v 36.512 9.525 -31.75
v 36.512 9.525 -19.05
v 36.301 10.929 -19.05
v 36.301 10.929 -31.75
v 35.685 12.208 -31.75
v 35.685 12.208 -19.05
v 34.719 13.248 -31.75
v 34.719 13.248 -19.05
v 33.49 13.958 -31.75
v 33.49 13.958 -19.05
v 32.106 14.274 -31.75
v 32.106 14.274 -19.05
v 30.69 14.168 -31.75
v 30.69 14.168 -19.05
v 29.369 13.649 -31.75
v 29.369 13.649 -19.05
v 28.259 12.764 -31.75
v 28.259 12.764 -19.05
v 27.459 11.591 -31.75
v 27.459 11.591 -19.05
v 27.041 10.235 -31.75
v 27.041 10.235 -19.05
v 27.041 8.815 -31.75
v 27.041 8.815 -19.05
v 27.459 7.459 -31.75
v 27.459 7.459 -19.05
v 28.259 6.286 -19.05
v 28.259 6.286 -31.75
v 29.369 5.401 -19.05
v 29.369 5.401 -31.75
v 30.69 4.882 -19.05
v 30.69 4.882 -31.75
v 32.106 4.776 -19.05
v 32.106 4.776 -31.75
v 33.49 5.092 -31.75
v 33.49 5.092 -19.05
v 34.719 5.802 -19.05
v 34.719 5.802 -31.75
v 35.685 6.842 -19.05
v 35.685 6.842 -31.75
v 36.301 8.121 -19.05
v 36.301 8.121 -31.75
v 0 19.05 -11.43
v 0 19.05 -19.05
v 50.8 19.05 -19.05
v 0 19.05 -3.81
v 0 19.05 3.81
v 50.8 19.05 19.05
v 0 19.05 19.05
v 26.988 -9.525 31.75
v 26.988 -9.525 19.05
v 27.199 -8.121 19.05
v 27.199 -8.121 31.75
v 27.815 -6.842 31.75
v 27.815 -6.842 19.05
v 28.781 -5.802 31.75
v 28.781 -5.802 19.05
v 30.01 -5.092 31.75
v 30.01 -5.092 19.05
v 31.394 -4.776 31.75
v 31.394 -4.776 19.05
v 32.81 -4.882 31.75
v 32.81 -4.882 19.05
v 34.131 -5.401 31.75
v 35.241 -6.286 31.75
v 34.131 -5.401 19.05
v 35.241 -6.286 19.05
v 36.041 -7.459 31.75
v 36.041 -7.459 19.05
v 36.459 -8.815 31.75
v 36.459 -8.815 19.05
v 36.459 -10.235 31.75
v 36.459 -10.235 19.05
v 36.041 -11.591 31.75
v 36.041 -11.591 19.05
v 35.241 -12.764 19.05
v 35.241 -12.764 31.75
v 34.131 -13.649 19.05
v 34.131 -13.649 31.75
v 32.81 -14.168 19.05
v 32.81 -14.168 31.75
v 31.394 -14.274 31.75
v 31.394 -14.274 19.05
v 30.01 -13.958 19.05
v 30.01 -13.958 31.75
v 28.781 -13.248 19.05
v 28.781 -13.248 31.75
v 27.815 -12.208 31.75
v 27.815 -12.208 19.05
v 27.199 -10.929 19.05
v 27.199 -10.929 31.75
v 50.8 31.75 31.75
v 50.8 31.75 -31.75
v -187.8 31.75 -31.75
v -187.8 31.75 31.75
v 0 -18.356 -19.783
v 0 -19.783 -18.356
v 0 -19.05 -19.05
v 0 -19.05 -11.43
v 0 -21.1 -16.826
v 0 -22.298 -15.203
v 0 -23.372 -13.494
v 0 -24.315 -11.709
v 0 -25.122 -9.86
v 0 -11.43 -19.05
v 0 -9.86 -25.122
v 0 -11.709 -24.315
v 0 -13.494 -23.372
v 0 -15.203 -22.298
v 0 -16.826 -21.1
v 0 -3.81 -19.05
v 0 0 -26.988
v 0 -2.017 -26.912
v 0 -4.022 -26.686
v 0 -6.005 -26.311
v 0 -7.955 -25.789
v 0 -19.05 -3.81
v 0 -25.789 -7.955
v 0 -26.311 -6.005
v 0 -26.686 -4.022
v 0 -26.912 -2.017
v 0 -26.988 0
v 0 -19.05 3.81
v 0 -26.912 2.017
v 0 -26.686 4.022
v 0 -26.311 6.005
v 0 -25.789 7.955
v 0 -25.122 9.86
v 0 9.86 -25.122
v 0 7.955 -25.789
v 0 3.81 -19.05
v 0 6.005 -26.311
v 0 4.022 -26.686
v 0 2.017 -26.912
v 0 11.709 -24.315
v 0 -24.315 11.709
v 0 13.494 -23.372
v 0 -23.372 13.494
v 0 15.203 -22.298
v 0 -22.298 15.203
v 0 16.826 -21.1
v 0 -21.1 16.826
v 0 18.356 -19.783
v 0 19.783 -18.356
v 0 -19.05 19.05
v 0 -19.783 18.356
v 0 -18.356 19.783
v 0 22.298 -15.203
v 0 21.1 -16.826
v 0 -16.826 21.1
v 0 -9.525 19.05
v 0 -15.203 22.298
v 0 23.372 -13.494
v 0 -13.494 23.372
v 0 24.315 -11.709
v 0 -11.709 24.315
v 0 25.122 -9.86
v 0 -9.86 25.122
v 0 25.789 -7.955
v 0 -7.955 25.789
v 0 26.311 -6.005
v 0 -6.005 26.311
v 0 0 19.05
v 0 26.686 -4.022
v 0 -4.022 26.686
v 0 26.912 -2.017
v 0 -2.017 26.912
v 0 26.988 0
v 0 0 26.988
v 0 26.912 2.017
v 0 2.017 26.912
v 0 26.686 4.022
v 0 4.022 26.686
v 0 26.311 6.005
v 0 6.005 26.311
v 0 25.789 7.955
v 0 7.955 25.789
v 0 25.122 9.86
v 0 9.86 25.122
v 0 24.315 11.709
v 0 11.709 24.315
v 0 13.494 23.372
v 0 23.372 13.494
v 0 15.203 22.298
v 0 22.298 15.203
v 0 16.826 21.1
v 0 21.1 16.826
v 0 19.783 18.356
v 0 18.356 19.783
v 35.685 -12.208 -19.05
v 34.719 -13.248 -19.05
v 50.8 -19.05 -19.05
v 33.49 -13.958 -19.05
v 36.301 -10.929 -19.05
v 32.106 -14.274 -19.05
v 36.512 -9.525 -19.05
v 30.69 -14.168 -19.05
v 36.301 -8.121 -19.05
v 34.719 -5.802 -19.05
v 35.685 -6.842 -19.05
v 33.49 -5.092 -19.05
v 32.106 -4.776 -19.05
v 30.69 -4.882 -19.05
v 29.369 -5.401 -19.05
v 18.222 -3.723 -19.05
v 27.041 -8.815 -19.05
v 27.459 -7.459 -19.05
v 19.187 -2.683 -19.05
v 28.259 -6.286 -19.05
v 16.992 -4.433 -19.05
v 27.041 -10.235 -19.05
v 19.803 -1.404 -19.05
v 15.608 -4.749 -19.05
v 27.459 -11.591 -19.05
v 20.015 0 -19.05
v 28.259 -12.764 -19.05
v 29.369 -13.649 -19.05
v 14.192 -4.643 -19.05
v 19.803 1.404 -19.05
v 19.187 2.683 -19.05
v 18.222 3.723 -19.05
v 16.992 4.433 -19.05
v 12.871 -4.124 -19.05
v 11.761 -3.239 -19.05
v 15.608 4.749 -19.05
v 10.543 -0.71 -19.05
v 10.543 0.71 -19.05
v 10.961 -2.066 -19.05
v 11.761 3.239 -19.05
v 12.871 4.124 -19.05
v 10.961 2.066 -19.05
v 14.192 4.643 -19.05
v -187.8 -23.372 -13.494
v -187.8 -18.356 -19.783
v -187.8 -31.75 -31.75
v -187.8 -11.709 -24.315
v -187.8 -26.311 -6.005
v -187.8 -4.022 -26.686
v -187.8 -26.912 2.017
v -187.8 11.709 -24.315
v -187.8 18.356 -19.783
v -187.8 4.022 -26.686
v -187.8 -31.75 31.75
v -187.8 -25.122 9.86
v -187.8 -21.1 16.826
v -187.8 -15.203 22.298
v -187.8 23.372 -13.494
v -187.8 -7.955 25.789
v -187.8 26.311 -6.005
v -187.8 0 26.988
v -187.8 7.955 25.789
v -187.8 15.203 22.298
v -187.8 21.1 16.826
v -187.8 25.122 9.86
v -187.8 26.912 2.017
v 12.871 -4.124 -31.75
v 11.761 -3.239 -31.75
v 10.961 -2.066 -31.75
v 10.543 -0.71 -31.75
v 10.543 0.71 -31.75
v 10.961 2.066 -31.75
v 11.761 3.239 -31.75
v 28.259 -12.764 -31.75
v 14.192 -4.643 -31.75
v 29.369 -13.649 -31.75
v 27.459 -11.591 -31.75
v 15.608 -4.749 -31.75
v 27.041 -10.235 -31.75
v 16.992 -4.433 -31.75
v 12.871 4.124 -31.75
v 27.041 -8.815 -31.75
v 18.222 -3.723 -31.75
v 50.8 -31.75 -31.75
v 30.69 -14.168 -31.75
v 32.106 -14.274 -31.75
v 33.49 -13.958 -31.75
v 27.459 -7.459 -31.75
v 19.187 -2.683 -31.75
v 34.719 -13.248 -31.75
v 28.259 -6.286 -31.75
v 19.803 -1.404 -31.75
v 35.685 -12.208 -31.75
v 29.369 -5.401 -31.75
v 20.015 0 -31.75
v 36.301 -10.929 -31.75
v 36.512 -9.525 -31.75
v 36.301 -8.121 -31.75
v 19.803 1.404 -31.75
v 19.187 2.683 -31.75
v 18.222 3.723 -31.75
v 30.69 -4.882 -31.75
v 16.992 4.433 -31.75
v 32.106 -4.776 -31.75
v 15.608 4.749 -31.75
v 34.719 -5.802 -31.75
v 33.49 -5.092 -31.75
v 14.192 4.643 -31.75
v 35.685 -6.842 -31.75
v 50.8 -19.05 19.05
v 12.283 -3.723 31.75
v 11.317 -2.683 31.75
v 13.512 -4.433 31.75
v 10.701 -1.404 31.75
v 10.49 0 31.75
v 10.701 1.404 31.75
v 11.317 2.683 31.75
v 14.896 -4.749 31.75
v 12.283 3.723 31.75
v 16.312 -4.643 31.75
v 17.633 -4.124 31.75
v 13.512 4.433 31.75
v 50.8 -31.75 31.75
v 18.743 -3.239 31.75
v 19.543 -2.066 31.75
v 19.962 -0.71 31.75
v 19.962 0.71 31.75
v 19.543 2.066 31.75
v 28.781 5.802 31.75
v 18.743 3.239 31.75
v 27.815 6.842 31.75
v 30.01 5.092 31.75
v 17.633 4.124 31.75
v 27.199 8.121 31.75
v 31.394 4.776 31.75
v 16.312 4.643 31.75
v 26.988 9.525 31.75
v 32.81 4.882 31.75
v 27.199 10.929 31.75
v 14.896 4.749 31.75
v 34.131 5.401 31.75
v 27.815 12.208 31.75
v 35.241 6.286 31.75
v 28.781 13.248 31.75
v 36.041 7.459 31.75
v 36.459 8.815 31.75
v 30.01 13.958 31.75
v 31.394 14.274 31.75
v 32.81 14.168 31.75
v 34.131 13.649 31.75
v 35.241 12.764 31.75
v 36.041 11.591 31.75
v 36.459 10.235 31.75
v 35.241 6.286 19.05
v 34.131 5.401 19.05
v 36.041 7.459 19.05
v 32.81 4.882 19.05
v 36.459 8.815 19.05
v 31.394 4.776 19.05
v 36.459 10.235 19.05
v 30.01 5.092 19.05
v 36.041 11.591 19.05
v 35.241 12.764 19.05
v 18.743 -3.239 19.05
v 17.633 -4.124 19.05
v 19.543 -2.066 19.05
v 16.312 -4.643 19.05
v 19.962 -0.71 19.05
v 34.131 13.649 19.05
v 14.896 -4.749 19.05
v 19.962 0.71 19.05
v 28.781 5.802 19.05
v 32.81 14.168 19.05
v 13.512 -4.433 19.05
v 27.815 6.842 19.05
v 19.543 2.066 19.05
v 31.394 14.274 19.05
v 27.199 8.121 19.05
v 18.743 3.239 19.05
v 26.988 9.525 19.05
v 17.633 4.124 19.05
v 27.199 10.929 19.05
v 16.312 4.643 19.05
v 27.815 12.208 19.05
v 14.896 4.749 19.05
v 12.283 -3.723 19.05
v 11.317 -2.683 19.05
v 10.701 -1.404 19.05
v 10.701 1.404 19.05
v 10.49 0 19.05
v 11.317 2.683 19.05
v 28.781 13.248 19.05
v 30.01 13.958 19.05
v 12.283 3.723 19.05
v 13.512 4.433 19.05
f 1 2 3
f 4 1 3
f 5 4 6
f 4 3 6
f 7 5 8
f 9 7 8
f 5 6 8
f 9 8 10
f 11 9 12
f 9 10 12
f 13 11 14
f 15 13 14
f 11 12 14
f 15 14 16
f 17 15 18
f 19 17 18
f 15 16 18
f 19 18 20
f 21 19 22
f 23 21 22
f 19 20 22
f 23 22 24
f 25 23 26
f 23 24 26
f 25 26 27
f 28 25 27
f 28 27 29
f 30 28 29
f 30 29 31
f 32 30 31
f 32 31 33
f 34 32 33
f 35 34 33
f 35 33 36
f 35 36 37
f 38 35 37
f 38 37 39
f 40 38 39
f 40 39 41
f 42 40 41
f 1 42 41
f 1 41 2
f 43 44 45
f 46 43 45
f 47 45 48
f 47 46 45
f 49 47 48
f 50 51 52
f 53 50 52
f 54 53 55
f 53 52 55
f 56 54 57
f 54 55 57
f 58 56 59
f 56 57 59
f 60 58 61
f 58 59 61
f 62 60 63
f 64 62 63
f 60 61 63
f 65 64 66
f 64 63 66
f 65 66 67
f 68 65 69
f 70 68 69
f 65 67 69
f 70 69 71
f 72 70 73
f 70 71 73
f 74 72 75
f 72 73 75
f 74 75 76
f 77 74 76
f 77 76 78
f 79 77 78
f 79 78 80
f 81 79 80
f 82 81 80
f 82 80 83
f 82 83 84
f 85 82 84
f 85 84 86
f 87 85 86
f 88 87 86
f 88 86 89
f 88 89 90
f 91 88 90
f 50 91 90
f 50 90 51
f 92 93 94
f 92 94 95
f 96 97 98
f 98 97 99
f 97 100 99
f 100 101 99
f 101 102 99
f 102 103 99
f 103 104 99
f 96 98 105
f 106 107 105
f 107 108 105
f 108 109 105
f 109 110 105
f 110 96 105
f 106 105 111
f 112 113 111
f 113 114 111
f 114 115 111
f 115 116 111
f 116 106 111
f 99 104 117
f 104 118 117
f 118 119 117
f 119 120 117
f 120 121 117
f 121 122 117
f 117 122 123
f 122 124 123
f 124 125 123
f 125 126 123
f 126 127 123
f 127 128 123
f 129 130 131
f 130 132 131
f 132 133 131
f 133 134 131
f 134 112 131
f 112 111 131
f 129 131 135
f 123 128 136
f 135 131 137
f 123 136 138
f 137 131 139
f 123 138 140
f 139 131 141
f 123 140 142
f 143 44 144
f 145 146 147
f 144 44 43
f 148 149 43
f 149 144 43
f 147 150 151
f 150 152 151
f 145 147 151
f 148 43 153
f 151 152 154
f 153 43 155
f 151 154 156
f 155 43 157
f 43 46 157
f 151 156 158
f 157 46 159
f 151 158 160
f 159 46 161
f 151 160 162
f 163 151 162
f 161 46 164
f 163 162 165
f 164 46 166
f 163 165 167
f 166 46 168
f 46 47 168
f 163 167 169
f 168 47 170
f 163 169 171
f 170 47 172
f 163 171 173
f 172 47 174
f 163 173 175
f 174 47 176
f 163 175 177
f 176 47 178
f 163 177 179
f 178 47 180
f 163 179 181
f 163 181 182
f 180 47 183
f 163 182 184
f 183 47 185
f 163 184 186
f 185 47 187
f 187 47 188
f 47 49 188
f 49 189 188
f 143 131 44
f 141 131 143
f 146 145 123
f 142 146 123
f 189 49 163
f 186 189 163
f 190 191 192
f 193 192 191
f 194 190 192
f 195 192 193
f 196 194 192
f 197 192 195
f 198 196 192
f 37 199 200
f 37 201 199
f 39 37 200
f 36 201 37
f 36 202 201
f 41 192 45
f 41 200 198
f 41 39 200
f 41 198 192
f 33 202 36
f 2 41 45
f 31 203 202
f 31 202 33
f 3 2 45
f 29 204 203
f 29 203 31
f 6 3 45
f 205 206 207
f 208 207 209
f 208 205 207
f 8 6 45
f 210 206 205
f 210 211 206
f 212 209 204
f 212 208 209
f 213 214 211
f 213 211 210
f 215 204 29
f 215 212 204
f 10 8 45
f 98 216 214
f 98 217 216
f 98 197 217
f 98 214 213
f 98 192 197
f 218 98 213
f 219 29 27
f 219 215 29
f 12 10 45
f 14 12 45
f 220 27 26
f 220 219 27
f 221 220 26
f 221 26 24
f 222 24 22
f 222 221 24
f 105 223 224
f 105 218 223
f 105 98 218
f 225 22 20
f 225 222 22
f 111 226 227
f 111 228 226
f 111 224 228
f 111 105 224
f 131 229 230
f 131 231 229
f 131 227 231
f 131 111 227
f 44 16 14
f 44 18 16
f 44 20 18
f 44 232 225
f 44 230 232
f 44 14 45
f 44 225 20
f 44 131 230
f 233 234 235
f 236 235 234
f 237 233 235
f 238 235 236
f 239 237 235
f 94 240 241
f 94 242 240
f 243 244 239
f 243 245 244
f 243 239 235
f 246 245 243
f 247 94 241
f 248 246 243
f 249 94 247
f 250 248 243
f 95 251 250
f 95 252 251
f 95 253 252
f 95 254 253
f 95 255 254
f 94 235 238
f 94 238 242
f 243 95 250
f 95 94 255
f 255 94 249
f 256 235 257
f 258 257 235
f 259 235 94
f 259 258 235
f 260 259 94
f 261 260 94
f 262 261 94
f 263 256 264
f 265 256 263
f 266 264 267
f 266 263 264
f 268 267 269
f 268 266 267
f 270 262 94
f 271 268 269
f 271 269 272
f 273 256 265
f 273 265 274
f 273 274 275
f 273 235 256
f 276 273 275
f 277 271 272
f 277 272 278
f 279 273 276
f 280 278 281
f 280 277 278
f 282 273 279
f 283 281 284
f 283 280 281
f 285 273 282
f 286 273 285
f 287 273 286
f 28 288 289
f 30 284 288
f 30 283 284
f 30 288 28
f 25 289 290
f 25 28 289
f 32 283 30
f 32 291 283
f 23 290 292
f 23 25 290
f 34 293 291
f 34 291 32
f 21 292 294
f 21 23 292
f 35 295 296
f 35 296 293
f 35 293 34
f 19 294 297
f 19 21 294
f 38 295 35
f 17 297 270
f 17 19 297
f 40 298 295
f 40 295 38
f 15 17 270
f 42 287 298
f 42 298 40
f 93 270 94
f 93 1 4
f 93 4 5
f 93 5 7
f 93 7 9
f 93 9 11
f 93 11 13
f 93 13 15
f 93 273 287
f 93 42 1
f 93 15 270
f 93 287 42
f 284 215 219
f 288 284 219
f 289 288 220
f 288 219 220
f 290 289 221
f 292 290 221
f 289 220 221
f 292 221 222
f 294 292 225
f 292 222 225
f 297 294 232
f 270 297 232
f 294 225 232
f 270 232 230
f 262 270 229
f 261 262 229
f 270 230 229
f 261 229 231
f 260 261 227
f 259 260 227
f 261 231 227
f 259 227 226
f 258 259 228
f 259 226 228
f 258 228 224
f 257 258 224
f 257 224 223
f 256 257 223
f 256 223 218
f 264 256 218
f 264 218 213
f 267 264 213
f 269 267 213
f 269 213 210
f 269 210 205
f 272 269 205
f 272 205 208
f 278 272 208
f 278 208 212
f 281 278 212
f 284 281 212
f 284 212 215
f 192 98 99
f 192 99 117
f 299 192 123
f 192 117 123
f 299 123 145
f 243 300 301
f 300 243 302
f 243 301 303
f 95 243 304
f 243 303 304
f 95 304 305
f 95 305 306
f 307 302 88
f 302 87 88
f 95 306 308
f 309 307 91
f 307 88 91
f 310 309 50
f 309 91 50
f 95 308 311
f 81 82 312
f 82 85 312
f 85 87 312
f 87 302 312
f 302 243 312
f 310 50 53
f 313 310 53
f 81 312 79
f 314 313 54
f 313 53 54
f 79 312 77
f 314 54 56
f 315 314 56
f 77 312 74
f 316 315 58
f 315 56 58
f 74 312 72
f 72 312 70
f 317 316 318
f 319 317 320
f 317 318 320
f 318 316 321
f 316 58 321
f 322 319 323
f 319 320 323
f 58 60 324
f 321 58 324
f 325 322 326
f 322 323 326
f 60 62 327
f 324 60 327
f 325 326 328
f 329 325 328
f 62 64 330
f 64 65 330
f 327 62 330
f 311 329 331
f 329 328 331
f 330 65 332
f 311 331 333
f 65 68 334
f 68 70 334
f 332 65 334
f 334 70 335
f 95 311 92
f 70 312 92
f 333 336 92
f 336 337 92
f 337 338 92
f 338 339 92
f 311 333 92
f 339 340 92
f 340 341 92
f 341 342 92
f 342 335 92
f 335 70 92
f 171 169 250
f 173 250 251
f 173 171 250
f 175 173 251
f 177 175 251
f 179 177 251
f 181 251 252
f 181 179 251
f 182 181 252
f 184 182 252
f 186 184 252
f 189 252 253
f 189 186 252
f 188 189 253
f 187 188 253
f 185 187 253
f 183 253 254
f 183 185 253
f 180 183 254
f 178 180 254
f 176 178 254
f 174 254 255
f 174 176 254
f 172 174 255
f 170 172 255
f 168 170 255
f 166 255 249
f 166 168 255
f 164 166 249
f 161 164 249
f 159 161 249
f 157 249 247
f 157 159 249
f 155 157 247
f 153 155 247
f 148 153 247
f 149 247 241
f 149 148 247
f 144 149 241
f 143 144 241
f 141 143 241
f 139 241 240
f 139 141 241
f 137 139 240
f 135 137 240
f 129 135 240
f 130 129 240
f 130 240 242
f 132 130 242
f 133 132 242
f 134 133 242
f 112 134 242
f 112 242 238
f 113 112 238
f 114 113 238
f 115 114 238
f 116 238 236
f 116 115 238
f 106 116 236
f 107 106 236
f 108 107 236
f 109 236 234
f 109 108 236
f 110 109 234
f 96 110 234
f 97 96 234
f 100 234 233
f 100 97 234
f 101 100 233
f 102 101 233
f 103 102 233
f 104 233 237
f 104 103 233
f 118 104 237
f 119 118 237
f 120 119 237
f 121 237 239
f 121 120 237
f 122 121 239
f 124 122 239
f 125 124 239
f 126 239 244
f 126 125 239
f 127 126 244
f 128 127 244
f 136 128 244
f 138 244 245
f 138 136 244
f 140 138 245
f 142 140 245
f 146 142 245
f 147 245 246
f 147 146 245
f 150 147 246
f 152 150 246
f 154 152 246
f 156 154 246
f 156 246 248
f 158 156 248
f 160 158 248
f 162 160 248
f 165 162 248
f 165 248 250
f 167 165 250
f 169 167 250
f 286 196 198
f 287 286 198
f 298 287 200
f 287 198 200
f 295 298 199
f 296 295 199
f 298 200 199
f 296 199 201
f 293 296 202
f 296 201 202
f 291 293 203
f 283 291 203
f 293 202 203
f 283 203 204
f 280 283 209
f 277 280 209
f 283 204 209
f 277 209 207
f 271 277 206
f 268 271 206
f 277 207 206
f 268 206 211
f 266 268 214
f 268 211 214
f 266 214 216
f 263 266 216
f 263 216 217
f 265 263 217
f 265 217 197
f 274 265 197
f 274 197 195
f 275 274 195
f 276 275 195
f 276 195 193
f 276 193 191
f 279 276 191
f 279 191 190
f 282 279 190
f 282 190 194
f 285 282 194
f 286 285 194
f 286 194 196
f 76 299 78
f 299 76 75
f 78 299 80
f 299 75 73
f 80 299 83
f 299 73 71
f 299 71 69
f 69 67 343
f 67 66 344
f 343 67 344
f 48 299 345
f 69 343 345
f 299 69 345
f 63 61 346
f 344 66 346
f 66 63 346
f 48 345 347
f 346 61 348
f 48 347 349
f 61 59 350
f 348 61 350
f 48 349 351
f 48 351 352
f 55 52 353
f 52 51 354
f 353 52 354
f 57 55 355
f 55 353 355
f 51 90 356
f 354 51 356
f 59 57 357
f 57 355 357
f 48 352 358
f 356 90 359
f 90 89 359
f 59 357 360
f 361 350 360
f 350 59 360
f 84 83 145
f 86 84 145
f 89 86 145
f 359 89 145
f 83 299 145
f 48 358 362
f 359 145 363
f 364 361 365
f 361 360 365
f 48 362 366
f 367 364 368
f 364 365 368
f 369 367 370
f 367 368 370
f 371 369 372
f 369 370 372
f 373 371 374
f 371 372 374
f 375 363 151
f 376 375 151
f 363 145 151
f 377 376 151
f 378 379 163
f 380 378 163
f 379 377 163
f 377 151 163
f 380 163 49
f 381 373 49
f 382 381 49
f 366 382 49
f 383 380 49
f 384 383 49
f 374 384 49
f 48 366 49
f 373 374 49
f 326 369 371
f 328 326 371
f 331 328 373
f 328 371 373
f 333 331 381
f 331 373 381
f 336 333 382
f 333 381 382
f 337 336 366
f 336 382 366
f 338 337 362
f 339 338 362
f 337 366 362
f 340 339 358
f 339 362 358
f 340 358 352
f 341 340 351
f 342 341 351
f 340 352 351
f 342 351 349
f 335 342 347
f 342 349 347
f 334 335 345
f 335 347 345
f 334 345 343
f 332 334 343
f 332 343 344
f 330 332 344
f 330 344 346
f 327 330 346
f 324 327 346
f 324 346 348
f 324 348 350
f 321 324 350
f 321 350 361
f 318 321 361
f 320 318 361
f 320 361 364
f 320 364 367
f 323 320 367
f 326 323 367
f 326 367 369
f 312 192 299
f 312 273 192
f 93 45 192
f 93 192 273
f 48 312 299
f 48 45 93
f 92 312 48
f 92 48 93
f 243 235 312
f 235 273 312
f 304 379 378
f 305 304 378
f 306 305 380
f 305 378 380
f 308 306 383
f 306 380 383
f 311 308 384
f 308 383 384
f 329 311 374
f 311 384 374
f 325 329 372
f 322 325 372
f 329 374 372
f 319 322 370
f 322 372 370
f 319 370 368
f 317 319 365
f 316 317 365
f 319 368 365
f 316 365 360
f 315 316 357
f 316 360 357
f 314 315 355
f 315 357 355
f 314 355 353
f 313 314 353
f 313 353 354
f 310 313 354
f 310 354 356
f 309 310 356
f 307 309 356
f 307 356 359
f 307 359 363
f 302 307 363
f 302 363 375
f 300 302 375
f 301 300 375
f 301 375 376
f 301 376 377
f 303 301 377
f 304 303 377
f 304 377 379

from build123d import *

# Parameters (mm, degrees)
SKETCH1_W                       = 63.5
SKETCH1_H                       = 63.5
SKETCH1_W_2                     = 38.1
SKETCH1_H_2                     = 38.1
BOSS_EXTRUDE1_DEPTH             = 50.8
SKETCH5_W                       = 63.5
SKETCH5_H                       = 63.5
SKETCH5_R                       = 26.9875
BOSS_EXTRUDE2_DEPTH             = 187.8
F_97_0_375_DIAMETER_HOLE2_D     = 9.525
F_97_0_375_DIAMETER_HOLE2_DEPTH = 12.7
F_97_0_375_DIAMETER_HOLE3_D     = 9.525


with BuildPart() as part:
    # Sketch1 → Boss-Extrude1 (new body)
    with BuildSketch(Plane.YZ):
        Rectangle(SKETCH1_W, SKETCH1_H)
        Rectangle(SKETCH1_W_2, SKETCH1_H_2, mode=Mode.SUBTRACT)
    extrude(amount=BOSS_EXTRUDE1_DEPTH)

    # Sketch5 → Boss-Extrude2 (add)
    with BuildSketch(Plane.ZY):
        Rectangle(SKETCH5_W, SKETCH5_H)
        Circle(SKETCH5_R, mode=Mode.SUBTRACT)
    extrude(amount=BOSS_EXTRUDE2_DEPTH)

    # #97 (0.375) Diameter Hole2
    with Locations(Plane(origin=(0, 0, -31.75), x_dir=(-1, 0, 0), z_dir=(0, 0, -1))):
        with Locations((-15.252216058, 0), (-31.75, 9.525), (-31.75, -9.525)):
            Hole(F_97_0_375_DIAMETER_HOLE2_D / 2, depth=F_97_0_375_DIAMETER_HOLE2_DEPTH)

    # #97 (0.375) Diameter Hole3 (through all)
    with Locations(Plane.XY.offset(31.75)):
        with Locations((31.75, -9.525), (31.75, 9.525), (15.252216058, 0)):
            Hole(F_97_0_375_DIAMETER_HOLE3_D / 2)


solid = part.part
